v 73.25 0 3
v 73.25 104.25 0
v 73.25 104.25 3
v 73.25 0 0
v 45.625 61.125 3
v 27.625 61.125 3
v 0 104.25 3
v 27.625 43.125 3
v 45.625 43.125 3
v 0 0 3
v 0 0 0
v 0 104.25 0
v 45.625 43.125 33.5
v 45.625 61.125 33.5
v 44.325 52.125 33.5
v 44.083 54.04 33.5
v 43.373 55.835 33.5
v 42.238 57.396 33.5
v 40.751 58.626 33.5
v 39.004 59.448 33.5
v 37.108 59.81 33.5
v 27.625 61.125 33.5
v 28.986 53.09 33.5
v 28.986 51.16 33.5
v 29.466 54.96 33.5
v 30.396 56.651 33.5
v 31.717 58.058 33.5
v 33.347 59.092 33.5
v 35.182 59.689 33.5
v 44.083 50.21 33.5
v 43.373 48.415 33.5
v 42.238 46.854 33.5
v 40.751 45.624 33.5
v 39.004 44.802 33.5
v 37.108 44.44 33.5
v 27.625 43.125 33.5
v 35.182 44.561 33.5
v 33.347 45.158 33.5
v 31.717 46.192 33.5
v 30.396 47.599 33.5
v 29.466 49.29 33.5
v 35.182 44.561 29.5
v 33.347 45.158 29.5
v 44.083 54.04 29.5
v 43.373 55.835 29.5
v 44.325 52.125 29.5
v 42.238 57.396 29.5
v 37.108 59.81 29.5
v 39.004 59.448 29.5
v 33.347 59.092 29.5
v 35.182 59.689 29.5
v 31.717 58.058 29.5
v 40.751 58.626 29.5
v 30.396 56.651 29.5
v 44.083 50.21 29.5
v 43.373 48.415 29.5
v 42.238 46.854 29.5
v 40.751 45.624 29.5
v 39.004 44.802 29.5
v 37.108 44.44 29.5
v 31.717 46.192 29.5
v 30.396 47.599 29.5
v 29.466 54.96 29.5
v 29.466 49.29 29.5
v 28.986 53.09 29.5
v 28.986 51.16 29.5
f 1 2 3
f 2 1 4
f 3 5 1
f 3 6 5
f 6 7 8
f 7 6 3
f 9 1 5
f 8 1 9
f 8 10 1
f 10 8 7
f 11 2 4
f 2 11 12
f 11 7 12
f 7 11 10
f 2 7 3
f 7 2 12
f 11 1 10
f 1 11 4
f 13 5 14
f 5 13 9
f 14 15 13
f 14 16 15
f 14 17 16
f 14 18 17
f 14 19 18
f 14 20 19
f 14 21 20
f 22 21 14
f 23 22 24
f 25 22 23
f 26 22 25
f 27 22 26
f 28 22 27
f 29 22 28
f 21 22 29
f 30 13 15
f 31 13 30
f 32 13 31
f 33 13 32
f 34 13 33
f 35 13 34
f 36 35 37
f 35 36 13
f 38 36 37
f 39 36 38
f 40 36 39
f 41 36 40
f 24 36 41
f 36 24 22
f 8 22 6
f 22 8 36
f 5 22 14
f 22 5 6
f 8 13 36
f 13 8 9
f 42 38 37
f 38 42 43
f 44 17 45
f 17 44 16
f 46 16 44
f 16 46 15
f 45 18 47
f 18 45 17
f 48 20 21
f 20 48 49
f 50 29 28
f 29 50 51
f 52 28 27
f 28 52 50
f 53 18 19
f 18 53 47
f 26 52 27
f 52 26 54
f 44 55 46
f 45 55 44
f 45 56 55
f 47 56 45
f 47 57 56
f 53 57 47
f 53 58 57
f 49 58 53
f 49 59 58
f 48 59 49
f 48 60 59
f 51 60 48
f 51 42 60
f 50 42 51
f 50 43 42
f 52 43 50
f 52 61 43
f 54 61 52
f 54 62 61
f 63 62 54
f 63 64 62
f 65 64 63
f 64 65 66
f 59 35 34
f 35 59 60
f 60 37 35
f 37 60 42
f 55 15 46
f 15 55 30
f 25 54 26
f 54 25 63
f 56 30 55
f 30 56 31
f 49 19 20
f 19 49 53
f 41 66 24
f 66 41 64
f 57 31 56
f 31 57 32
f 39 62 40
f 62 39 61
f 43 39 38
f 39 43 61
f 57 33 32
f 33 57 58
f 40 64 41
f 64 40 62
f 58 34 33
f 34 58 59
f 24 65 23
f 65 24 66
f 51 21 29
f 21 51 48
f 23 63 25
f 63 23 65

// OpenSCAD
length = 74 - .75;
width = 105 - .75;
height = 3;

//Based on magnet size:
pillarSideLength = 18;
pillarSideOffset = .5;

magnetBaseInnerDiameter = 15.4;
magnetHeight = 4.0;

spaceBetweenCircles = 2;
wallThickness = spaceBetweenCircles;
//TODO: Set this height!!!
pillarHeight = 15 * 2 + .5 + height;

difference() {
union(){
    cube([length, width, height]);


//----------------------------------


            
//---------------------------------------------------------------------
    
          

//----------------------------------------
   
    translate([length/2 - ((pillarSideLength)/2), width/2 - ((pillarSideLength)/2), 0])
        cube([pillarSideLength, pillarSideLength, pillarHeight]);
        

}
    translate([length/2,  width/2, pillarHeight - magnetHeight])
        cylinder(magnetHeight, d=magnetBaseInnerDiameter);

}
